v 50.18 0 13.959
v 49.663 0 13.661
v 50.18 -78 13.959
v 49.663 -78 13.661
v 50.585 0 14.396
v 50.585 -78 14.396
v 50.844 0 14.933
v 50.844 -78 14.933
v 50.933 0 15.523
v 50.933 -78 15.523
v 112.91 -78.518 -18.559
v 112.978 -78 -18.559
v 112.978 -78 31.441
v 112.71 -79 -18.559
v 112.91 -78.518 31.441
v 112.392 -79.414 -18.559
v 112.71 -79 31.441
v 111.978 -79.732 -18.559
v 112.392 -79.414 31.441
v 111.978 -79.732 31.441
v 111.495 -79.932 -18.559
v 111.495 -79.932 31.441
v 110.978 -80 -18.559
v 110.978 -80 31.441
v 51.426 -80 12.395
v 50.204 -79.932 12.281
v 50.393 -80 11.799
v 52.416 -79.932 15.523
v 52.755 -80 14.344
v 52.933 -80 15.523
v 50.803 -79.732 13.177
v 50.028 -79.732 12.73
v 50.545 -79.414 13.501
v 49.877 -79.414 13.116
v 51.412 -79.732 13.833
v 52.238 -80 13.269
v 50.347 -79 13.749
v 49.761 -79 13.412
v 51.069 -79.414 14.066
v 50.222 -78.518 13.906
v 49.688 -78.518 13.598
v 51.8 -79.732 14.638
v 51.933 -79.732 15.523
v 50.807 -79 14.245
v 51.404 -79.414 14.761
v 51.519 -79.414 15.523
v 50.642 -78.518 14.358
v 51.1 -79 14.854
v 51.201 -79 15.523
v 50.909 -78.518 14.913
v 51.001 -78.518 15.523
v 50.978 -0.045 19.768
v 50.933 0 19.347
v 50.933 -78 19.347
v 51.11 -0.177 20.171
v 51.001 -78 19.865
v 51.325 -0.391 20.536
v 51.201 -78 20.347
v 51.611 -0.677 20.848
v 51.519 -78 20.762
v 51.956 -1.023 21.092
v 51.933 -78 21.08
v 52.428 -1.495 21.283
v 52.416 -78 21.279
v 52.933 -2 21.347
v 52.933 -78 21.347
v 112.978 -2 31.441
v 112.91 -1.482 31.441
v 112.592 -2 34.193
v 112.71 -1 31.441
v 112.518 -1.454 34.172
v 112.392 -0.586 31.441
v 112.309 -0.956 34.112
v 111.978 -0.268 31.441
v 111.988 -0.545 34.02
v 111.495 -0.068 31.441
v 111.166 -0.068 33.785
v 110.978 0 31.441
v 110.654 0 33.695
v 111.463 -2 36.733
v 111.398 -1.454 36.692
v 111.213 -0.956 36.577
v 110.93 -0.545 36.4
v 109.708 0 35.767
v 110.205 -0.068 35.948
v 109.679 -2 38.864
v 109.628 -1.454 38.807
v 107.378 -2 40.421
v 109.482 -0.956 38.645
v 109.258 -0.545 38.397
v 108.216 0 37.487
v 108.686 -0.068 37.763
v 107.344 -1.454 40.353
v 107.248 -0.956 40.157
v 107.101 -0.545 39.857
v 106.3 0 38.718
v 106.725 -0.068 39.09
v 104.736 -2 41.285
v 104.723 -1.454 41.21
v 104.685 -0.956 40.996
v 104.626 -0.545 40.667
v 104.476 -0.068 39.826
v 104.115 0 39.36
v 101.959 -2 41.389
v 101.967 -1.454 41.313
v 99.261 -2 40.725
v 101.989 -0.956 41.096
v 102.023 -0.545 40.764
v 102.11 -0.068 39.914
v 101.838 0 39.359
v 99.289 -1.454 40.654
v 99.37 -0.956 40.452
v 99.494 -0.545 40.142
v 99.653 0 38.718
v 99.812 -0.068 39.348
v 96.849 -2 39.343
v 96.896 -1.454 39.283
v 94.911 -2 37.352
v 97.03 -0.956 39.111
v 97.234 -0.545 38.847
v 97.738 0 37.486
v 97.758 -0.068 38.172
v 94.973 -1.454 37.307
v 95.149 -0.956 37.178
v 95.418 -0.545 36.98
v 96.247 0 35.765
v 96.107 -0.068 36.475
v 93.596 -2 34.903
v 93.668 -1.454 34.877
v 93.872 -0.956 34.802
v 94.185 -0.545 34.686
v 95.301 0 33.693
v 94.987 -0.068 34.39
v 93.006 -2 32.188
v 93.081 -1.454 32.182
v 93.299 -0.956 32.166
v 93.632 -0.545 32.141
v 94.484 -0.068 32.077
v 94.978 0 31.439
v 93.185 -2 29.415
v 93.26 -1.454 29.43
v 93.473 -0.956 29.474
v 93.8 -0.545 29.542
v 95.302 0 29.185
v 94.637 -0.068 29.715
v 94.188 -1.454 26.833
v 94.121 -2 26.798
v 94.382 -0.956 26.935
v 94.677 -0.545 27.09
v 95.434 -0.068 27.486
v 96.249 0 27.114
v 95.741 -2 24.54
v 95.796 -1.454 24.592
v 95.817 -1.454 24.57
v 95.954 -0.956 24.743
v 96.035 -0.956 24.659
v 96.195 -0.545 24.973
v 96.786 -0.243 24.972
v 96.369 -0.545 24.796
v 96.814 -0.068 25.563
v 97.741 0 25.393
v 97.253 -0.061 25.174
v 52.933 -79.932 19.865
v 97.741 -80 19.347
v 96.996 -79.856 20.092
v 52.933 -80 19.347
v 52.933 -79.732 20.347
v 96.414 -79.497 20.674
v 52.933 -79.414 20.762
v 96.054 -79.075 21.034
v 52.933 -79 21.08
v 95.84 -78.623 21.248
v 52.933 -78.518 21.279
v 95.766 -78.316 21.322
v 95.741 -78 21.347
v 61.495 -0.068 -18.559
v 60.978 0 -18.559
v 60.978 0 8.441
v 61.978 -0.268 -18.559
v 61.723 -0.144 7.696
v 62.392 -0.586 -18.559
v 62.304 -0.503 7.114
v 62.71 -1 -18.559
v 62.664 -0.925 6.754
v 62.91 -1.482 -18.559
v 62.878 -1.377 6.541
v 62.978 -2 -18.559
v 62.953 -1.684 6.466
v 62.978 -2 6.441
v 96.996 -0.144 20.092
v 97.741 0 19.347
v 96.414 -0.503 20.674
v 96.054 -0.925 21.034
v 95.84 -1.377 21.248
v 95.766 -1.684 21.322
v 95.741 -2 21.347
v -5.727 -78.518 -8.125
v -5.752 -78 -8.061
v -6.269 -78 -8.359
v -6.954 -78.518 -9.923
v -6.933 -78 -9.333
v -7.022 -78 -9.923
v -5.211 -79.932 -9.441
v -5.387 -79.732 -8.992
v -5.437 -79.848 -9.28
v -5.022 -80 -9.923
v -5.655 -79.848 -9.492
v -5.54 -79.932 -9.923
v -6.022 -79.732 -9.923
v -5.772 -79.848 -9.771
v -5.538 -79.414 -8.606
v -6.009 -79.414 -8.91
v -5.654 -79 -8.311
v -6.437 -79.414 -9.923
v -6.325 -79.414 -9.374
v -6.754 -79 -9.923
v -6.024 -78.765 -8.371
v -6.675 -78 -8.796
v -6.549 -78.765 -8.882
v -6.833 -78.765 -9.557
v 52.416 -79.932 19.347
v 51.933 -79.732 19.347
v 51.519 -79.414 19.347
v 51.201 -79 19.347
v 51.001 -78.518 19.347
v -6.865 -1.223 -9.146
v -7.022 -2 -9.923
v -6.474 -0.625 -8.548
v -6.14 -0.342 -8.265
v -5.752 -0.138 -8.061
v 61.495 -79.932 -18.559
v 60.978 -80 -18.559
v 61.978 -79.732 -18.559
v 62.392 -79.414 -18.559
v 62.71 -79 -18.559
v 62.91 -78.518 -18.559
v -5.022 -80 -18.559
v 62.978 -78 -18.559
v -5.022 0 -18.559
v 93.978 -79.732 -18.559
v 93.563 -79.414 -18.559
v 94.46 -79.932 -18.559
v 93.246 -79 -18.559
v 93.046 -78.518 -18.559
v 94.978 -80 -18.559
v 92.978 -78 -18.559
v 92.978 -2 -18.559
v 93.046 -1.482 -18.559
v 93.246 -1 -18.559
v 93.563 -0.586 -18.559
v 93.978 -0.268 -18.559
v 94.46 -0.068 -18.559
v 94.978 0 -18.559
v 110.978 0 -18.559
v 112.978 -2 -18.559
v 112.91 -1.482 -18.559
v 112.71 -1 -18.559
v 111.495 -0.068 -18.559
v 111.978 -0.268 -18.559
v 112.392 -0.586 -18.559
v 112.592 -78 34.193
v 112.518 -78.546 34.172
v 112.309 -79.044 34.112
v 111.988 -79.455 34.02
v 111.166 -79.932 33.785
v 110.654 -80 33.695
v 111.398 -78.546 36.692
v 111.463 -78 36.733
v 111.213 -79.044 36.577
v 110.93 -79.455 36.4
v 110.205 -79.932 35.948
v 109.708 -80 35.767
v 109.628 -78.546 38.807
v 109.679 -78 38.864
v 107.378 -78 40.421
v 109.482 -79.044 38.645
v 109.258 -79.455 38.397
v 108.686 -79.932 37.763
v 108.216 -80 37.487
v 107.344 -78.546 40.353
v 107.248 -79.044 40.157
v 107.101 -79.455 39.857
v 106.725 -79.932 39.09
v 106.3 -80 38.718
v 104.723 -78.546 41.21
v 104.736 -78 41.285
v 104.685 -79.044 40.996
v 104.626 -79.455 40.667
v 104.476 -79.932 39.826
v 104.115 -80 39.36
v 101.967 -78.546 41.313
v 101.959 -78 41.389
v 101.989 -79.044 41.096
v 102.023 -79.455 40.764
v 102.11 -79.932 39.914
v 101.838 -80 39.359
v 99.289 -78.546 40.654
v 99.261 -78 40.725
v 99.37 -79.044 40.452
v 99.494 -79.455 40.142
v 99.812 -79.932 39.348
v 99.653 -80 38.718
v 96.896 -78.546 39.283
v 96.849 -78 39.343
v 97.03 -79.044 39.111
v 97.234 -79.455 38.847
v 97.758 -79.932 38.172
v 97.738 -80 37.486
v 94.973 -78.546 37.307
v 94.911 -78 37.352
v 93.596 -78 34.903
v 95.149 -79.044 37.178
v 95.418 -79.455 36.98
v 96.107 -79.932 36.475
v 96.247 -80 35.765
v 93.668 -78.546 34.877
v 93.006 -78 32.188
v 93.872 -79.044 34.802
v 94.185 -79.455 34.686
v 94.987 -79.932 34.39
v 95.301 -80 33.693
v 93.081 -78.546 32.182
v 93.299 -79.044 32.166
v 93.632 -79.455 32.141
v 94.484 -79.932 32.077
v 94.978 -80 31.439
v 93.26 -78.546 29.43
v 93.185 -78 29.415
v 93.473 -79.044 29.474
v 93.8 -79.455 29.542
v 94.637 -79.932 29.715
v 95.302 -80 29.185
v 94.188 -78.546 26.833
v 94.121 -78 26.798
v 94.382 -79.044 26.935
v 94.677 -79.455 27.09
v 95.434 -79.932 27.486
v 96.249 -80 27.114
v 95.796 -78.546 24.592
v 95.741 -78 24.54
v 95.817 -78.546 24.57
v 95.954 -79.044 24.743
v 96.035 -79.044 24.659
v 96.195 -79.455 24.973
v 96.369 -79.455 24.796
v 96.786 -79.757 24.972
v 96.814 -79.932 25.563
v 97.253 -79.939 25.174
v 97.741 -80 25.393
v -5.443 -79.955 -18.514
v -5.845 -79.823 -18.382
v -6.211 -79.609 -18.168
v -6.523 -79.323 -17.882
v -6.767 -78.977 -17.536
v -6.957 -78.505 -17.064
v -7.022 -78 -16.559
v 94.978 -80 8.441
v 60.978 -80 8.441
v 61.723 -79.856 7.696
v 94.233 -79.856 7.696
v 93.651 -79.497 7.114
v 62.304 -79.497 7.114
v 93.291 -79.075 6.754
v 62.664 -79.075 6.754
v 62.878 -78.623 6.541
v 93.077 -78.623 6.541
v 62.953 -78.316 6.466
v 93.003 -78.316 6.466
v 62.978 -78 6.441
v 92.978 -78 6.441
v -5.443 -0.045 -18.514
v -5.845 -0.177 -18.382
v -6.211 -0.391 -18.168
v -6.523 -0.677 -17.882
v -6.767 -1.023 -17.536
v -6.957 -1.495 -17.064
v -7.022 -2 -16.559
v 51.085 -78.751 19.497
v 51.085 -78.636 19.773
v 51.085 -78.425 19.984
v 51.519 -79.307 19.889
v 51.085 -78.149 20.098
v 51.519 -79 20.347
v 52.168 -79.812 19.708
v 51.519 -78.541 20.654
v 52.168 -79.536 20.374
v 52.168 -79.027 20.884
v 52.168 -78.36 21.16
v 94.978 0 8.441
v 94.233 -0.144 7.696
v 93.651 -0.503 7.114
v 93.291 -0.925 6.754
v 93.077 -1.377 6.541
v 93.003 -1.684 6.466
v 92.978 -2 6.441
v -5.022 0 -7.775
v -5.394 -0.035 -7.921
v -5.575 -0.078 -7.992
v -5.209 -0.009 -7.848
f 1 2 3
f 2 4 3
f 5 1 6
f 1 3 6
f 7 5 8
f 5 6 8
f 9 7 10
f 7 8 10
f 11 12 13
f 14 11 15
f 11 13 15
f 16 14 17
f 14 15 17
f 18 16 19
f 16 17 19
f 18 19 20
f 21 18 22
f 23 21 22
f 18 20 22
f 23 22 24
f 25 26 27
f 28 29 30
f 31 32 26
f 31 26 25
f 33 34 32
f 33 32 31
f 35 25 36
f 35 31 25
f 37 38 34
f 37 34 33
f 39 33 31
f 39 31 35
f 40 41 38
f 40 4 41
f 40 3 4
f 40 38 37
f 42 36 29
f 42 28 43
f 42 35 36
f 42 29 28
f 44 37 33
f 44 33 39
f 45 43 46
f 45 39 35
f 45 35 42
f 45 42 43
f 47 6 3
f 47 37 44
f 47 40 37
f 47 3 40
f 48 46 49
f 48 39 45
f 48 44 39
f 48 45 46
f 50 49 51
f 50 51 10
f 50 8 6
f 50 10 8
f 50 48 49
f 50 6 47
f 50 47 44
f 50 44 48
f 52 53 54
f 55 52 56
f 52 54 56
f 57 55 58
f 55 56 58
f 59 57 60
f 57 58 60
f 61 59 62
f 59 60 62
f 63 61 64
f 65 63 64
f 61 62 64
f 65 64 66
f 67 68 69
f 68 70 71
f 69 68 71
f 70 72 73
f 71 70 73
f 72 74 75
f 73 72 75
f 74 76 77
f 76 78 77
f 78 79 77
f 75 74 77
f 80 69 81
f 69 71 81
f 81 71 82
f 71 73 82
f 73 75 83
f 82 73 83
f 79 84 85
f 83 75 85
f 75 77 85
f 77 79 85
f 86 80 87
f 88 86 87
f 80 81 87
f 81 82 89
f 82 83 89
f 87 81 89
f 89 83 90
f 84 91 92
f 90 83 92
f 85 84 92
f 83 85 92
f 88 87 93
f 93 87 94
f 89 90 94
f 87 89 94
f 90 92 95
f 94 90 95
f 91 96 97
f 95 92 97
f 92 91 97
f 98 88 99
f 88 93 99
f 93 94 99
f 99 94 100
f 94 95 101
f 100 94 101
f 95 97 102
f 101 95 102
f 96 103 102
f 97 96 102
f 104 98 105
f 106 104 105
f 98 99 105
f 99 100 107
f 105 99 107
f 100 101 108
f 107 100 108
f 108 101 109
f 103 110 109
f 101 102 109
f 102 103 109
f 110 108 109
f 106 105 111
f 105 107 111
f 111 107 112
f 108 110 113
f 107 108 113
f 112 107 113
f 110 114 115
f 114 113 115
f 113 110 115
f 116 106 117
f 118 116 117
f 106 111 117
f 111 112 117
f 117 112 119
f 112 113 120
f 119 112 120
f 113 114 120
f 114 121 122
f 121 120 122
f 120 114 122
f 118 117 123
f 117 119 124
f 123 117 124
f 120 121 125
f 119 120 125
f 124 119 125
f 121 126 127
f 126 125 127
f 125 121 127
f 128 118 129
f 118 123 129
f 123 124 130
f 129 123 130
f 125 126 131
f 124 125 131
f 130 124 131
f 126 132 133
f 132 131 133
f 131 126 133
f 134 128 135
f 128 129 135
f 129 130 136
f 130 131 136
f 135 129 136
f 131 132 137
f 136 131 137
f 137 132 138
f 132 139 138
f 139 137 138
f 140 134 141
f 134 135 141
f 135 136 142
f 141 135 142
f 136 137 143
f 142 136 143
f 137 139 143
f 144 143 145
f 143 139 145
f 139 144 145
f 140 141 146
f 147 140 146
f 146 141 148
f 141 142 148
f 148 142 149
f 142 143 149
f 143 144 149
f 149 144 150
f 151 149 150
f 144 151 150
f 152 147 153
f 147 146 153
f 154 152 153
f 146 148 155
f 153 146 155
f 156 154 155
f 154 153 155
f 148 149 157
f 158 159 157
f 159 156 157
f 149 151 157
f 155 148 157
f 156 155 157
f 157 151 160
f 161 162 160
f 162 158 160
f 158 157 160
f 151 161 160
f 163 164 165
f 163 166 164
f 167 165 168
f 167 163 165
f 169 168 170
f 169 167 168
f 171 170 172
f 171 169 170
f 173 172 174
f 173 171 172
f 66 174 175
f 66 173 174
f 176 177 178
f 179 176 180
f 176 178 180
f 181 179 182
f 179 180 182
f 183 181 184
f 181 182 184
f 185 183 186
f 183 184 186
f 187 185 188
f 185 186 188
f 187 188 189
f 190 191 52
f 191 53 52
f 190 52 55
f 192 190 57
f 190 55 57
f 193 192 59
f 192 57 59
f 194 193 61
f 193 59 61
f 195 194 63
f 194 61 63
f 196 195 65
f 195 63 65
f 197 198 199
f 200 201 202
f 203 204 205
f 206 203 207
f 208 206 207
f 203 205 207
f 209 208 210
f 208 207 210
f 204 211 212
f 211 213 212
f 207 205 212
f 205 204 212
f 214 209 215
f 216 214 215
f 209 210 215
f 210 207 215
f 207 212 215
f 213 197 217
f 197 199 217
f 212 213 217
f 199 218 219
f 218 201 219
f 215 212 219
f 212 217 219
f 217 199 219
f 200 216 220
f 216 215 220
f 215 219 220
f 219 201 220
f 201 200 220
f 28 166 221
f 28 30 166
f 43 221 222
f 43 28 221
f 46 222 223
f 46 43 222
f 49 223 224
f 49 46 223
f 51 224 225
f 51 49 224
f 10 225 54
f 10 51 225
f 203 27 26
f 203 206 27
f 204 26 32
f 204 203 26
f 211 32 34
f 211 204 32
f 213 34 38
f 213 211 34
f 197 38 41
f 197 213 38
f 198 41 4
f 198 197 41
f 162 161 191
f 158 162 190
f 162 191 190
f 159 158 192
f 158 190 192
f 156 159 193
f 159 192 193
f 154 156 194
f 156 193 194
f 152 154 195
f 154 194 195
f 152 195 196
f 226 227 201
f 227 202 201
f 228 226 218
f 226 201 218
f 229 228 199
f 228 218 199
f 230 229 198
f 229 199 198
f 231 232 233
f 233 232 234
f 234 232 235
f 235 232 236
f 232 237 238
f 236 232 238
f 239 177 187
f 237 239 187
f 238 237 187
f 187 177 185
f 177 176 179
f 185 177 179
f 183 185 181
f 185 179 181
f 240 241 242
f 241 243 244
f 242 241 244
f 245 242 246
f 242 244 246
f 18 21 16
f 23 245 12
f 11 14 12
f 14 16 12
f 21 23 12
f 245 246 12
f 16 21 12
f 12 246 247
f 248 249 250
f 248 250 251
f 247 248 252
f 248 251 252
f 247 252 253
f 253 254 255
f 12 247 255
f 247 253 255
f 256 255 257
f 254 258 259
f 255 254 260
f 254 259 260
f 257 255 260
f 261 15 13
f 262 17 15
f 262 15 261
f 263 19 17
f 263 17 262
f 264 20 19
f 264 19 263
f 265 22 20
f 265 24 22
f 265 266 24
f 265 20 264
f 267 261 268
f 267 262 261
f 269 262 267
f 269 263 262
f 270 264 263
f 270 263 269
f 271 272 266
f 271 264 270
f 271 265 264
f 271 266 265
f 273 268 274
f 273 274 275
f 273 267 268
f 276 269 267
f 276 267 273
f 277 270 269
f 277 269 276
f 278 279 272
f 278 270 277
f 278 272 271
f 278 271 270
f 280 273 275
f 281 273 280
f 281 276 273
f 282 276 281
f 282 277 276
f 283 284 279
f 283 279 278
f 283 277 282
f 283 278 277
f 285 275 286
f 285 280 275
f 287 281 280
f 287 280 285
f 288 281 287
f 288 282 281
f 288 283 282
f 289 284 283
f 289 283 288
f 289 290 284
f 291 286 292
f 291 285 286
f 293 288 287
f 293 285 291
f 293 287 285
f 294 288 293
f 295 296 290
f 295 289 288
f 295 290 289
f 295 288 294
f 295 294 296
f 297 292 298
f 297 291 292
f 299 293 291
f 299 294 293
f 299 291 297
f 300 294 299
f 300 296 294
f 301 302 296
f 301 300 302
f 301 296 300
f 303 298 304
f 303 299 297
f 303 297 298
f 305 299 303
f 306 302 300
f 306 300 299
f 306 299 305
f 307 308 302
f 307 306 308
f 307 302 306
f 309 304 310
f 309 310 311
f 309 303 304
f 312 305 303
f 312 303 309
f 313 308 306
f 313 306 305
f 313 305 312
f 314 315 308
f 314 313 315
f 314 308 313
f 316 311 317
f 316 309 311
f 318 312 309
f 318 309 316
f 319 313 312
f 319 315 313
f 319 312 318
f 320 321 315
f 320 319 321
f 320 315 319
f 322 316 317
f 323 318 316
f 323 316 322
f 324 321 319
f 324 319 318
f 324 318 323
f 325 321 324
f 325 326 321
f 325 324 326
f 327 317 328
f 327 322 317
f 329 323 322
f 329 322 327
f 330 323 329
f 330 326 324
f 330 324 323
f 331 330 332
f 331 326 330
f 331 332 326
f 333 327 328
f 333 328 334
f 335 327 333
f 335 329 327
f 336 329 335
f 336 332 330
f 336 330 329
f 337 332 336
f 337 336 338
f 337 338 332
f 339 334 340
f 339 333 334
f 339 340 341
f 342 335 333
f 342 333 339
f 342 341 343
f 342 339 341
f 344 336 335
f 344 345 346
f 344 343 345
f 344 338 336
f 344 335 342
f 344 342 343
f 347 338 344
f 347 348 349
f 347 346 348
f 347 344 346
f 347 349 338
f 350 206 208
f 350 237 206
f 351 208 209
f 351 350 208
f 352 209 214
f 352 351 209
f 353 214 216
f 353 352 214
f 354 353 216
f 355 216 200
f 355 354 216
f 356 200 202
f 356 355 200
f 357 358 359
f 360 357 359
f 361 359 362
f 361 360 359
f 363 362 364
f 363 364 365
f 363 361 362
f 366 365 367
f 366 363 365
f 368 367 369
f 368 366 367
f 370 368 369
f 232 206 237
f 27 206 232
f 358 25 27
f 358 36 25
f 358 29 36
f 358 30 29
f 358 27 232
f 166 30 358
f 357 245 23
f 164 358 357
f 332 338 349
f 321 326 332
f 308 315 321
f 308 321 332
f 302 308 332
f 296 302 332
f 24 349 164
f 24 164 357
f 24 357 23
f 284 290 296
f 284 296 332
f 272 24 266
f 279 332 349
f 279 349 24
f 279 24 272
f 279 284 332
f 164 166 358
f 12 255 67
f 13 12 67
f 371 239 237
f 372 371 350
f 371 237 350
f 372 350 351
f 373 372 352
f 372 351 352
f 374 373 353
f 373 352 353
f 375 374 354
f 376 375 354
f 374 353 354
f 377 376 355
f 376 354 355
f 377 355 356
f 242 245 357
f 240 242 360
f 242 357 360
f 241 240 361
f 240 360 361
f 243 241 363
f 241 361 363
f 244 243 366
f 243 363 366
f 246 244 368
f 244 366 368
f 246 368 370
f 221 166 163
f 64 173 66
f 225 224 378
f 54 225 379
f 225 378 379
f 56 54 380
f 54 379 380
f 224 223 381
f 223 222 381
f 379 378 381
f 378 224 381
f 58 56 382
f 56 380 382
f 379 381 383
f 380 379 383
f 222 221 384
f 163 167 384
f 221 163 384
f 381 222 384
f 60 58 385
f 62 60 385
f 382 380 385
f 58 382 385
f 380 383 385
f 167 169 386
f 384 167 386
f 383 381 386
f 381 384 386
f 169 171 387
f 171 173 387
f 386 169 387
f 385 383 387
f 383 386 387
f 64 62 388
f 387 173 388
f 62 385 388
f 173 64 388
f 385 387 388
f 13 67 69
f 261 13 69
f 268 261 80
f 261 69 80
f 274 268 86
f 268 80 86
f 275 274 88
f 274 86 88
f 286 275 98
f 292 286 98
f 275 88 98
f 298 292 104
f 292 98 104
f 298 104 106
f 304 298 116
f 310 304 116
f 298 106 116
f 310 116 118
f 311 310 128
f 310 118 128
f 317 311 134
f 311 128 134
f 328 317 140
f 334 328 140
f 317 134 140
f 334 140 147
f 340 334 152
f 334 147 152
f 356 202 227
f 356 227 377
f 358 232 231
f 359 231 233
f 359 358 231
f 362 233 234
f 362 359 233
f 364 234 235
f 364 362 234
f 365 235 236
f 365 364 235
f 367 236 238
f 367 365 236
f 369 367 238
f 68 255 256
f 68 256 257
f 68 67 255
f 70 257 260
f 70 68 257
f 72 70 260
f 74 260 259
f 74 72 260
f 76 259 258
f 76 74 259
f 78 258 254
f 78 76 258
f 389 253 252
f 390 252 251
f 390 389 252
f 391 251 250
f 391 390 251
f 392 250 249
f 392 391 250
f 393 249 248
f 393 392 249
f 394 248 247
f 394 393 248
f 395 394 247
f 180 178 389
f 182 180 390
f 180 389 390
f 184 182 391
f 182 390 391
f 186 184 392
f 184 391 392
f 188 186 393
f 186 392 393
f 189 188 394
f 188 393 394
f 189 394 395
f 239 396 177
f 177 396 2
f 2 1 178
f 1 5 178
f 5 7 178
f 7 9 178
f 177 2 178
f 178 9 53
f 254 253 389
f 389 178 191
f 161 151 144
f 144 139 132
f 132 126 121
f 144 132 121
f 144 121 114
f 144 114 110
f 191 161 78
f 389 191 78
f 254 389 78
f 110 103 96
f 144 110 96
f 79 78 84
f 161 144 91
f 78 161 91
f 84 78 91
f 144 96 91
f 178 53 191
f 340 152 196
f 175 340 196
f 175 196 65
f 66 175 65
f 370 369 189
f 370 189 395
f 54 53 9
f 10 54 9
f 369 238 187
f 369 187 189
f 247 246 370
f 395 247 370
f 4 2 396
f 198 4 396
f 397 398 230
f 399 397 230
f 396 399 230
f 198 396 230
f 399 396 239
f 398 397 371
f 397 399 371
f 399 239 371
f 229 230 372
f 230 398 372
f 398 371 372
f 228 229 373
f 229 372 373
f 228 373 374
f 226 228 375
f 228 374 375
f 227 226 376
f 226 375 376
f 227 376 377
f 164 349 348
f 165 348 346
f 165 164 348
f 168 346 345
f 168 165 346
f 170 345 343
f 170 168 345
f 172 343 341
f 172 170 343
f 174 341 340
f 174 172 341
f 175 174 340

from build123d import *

# Parameters (mm, degrees)
F1_DEPTH = 80
F2_W     = 30
F2_H     = 25
F3_DEPTH = 80.001
F4_R     = 2


# Not quite as in the source:
# - a feature names something its author has since deleted; it is built from what else it names


with BuildPart() as f1:
    # F0 (on Front) → F1 (new body)
    with BuildSketch(Plane.XZ):
        with BuildLine():
            Line((112.9777067155, -18.5589175671), (112.9777067155, 31.4410824329))
            ThreePointArc((112.9777067155, 31.4410824329), (99.260783713, 40.7246422778), (95.7408100367, 24.5398270065))
            Line((95.7408100367, 24.5398270065), (95.7408100367, 21.3474755859))
            Line((95.7408100367, 21.3474755859), (50.9332562928, 21.3474755859))
            Line((50.9332562928, 21.3474755859), (50.9332562928, 14.1588503625))
            Line((50.9332562928, 14.1588503625), (-7.0222932845, -8.5589175671))
            Line((-7.0222932845, -8.5589175671), (-7.0222932845, -18.5589175671))
            Line((-7.0222932845, -18.5589175671), (112.9777067155, -18.5589175671))
        make_face()
    extrude(amount=F1_DEPTH)

    # F2 (on face) → F3 (cut, through all)
    with BuildSketch(Plane.XZ.offset(80)):
        with Locations((77.9777067155, -6.0589175671)):
            Rectangle(F2_W, F2_H)
    extrude(amount=-F3_DEPTH, mode=Mode.SUBTRACT)

    # F4
    f4_edges = [f1.edges().sort_by_distance(p)[0] for p in [
        (73.337033, -80, 21.347476),
        (95.74081, -80, 22.943651),
        (99.260784, -80, 40.724642),
        (92.977707, -80, -6.058918),
        (77.977707, -80, 6.441082),
        (62.977707, -80, -6.058918),
        (50.933256, -80, 17.753163),
        (50.933256, -40, 21.347476),
        (73.337033, 0, 21.347476),
        (-7.022293, 0, -13.558918),
        (62.977707, 0, -6.058918),
        (77.977707, 0, 6.441082),
        (92.977707, 0, -6.058918),
        (95.74081, 0, 22.943651),
        (99.260784, 0, 40.724642),
        (-7.022293, -80, -13.558918),
        (-7.022293, -40, -8.558918),
        (-7.022293, -40, -18.558918),
        (50.933256, -40, 14.15885),
        (21.955482, -80, 2.799966),
        (112.977707, 0, 6.441082),
        (112.977707, -80, 6.441082),
    ]]
    fillet(f4_edges, radius=F4_R)


solid = f1.part
